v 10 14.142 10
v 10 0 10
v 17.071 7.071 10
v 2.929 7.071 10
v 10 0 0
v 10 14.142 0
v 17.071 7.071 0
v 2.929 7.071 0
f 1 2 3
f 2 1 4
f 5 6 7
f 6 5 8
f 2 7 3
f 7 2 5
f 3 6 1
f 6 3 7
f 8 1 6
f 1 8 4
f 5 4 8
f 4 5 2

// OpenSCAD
translate([10, 0, 0]) rotate([0, 0, 45]) scale([2, 2, 2]) cube([5, 5, 5]);
